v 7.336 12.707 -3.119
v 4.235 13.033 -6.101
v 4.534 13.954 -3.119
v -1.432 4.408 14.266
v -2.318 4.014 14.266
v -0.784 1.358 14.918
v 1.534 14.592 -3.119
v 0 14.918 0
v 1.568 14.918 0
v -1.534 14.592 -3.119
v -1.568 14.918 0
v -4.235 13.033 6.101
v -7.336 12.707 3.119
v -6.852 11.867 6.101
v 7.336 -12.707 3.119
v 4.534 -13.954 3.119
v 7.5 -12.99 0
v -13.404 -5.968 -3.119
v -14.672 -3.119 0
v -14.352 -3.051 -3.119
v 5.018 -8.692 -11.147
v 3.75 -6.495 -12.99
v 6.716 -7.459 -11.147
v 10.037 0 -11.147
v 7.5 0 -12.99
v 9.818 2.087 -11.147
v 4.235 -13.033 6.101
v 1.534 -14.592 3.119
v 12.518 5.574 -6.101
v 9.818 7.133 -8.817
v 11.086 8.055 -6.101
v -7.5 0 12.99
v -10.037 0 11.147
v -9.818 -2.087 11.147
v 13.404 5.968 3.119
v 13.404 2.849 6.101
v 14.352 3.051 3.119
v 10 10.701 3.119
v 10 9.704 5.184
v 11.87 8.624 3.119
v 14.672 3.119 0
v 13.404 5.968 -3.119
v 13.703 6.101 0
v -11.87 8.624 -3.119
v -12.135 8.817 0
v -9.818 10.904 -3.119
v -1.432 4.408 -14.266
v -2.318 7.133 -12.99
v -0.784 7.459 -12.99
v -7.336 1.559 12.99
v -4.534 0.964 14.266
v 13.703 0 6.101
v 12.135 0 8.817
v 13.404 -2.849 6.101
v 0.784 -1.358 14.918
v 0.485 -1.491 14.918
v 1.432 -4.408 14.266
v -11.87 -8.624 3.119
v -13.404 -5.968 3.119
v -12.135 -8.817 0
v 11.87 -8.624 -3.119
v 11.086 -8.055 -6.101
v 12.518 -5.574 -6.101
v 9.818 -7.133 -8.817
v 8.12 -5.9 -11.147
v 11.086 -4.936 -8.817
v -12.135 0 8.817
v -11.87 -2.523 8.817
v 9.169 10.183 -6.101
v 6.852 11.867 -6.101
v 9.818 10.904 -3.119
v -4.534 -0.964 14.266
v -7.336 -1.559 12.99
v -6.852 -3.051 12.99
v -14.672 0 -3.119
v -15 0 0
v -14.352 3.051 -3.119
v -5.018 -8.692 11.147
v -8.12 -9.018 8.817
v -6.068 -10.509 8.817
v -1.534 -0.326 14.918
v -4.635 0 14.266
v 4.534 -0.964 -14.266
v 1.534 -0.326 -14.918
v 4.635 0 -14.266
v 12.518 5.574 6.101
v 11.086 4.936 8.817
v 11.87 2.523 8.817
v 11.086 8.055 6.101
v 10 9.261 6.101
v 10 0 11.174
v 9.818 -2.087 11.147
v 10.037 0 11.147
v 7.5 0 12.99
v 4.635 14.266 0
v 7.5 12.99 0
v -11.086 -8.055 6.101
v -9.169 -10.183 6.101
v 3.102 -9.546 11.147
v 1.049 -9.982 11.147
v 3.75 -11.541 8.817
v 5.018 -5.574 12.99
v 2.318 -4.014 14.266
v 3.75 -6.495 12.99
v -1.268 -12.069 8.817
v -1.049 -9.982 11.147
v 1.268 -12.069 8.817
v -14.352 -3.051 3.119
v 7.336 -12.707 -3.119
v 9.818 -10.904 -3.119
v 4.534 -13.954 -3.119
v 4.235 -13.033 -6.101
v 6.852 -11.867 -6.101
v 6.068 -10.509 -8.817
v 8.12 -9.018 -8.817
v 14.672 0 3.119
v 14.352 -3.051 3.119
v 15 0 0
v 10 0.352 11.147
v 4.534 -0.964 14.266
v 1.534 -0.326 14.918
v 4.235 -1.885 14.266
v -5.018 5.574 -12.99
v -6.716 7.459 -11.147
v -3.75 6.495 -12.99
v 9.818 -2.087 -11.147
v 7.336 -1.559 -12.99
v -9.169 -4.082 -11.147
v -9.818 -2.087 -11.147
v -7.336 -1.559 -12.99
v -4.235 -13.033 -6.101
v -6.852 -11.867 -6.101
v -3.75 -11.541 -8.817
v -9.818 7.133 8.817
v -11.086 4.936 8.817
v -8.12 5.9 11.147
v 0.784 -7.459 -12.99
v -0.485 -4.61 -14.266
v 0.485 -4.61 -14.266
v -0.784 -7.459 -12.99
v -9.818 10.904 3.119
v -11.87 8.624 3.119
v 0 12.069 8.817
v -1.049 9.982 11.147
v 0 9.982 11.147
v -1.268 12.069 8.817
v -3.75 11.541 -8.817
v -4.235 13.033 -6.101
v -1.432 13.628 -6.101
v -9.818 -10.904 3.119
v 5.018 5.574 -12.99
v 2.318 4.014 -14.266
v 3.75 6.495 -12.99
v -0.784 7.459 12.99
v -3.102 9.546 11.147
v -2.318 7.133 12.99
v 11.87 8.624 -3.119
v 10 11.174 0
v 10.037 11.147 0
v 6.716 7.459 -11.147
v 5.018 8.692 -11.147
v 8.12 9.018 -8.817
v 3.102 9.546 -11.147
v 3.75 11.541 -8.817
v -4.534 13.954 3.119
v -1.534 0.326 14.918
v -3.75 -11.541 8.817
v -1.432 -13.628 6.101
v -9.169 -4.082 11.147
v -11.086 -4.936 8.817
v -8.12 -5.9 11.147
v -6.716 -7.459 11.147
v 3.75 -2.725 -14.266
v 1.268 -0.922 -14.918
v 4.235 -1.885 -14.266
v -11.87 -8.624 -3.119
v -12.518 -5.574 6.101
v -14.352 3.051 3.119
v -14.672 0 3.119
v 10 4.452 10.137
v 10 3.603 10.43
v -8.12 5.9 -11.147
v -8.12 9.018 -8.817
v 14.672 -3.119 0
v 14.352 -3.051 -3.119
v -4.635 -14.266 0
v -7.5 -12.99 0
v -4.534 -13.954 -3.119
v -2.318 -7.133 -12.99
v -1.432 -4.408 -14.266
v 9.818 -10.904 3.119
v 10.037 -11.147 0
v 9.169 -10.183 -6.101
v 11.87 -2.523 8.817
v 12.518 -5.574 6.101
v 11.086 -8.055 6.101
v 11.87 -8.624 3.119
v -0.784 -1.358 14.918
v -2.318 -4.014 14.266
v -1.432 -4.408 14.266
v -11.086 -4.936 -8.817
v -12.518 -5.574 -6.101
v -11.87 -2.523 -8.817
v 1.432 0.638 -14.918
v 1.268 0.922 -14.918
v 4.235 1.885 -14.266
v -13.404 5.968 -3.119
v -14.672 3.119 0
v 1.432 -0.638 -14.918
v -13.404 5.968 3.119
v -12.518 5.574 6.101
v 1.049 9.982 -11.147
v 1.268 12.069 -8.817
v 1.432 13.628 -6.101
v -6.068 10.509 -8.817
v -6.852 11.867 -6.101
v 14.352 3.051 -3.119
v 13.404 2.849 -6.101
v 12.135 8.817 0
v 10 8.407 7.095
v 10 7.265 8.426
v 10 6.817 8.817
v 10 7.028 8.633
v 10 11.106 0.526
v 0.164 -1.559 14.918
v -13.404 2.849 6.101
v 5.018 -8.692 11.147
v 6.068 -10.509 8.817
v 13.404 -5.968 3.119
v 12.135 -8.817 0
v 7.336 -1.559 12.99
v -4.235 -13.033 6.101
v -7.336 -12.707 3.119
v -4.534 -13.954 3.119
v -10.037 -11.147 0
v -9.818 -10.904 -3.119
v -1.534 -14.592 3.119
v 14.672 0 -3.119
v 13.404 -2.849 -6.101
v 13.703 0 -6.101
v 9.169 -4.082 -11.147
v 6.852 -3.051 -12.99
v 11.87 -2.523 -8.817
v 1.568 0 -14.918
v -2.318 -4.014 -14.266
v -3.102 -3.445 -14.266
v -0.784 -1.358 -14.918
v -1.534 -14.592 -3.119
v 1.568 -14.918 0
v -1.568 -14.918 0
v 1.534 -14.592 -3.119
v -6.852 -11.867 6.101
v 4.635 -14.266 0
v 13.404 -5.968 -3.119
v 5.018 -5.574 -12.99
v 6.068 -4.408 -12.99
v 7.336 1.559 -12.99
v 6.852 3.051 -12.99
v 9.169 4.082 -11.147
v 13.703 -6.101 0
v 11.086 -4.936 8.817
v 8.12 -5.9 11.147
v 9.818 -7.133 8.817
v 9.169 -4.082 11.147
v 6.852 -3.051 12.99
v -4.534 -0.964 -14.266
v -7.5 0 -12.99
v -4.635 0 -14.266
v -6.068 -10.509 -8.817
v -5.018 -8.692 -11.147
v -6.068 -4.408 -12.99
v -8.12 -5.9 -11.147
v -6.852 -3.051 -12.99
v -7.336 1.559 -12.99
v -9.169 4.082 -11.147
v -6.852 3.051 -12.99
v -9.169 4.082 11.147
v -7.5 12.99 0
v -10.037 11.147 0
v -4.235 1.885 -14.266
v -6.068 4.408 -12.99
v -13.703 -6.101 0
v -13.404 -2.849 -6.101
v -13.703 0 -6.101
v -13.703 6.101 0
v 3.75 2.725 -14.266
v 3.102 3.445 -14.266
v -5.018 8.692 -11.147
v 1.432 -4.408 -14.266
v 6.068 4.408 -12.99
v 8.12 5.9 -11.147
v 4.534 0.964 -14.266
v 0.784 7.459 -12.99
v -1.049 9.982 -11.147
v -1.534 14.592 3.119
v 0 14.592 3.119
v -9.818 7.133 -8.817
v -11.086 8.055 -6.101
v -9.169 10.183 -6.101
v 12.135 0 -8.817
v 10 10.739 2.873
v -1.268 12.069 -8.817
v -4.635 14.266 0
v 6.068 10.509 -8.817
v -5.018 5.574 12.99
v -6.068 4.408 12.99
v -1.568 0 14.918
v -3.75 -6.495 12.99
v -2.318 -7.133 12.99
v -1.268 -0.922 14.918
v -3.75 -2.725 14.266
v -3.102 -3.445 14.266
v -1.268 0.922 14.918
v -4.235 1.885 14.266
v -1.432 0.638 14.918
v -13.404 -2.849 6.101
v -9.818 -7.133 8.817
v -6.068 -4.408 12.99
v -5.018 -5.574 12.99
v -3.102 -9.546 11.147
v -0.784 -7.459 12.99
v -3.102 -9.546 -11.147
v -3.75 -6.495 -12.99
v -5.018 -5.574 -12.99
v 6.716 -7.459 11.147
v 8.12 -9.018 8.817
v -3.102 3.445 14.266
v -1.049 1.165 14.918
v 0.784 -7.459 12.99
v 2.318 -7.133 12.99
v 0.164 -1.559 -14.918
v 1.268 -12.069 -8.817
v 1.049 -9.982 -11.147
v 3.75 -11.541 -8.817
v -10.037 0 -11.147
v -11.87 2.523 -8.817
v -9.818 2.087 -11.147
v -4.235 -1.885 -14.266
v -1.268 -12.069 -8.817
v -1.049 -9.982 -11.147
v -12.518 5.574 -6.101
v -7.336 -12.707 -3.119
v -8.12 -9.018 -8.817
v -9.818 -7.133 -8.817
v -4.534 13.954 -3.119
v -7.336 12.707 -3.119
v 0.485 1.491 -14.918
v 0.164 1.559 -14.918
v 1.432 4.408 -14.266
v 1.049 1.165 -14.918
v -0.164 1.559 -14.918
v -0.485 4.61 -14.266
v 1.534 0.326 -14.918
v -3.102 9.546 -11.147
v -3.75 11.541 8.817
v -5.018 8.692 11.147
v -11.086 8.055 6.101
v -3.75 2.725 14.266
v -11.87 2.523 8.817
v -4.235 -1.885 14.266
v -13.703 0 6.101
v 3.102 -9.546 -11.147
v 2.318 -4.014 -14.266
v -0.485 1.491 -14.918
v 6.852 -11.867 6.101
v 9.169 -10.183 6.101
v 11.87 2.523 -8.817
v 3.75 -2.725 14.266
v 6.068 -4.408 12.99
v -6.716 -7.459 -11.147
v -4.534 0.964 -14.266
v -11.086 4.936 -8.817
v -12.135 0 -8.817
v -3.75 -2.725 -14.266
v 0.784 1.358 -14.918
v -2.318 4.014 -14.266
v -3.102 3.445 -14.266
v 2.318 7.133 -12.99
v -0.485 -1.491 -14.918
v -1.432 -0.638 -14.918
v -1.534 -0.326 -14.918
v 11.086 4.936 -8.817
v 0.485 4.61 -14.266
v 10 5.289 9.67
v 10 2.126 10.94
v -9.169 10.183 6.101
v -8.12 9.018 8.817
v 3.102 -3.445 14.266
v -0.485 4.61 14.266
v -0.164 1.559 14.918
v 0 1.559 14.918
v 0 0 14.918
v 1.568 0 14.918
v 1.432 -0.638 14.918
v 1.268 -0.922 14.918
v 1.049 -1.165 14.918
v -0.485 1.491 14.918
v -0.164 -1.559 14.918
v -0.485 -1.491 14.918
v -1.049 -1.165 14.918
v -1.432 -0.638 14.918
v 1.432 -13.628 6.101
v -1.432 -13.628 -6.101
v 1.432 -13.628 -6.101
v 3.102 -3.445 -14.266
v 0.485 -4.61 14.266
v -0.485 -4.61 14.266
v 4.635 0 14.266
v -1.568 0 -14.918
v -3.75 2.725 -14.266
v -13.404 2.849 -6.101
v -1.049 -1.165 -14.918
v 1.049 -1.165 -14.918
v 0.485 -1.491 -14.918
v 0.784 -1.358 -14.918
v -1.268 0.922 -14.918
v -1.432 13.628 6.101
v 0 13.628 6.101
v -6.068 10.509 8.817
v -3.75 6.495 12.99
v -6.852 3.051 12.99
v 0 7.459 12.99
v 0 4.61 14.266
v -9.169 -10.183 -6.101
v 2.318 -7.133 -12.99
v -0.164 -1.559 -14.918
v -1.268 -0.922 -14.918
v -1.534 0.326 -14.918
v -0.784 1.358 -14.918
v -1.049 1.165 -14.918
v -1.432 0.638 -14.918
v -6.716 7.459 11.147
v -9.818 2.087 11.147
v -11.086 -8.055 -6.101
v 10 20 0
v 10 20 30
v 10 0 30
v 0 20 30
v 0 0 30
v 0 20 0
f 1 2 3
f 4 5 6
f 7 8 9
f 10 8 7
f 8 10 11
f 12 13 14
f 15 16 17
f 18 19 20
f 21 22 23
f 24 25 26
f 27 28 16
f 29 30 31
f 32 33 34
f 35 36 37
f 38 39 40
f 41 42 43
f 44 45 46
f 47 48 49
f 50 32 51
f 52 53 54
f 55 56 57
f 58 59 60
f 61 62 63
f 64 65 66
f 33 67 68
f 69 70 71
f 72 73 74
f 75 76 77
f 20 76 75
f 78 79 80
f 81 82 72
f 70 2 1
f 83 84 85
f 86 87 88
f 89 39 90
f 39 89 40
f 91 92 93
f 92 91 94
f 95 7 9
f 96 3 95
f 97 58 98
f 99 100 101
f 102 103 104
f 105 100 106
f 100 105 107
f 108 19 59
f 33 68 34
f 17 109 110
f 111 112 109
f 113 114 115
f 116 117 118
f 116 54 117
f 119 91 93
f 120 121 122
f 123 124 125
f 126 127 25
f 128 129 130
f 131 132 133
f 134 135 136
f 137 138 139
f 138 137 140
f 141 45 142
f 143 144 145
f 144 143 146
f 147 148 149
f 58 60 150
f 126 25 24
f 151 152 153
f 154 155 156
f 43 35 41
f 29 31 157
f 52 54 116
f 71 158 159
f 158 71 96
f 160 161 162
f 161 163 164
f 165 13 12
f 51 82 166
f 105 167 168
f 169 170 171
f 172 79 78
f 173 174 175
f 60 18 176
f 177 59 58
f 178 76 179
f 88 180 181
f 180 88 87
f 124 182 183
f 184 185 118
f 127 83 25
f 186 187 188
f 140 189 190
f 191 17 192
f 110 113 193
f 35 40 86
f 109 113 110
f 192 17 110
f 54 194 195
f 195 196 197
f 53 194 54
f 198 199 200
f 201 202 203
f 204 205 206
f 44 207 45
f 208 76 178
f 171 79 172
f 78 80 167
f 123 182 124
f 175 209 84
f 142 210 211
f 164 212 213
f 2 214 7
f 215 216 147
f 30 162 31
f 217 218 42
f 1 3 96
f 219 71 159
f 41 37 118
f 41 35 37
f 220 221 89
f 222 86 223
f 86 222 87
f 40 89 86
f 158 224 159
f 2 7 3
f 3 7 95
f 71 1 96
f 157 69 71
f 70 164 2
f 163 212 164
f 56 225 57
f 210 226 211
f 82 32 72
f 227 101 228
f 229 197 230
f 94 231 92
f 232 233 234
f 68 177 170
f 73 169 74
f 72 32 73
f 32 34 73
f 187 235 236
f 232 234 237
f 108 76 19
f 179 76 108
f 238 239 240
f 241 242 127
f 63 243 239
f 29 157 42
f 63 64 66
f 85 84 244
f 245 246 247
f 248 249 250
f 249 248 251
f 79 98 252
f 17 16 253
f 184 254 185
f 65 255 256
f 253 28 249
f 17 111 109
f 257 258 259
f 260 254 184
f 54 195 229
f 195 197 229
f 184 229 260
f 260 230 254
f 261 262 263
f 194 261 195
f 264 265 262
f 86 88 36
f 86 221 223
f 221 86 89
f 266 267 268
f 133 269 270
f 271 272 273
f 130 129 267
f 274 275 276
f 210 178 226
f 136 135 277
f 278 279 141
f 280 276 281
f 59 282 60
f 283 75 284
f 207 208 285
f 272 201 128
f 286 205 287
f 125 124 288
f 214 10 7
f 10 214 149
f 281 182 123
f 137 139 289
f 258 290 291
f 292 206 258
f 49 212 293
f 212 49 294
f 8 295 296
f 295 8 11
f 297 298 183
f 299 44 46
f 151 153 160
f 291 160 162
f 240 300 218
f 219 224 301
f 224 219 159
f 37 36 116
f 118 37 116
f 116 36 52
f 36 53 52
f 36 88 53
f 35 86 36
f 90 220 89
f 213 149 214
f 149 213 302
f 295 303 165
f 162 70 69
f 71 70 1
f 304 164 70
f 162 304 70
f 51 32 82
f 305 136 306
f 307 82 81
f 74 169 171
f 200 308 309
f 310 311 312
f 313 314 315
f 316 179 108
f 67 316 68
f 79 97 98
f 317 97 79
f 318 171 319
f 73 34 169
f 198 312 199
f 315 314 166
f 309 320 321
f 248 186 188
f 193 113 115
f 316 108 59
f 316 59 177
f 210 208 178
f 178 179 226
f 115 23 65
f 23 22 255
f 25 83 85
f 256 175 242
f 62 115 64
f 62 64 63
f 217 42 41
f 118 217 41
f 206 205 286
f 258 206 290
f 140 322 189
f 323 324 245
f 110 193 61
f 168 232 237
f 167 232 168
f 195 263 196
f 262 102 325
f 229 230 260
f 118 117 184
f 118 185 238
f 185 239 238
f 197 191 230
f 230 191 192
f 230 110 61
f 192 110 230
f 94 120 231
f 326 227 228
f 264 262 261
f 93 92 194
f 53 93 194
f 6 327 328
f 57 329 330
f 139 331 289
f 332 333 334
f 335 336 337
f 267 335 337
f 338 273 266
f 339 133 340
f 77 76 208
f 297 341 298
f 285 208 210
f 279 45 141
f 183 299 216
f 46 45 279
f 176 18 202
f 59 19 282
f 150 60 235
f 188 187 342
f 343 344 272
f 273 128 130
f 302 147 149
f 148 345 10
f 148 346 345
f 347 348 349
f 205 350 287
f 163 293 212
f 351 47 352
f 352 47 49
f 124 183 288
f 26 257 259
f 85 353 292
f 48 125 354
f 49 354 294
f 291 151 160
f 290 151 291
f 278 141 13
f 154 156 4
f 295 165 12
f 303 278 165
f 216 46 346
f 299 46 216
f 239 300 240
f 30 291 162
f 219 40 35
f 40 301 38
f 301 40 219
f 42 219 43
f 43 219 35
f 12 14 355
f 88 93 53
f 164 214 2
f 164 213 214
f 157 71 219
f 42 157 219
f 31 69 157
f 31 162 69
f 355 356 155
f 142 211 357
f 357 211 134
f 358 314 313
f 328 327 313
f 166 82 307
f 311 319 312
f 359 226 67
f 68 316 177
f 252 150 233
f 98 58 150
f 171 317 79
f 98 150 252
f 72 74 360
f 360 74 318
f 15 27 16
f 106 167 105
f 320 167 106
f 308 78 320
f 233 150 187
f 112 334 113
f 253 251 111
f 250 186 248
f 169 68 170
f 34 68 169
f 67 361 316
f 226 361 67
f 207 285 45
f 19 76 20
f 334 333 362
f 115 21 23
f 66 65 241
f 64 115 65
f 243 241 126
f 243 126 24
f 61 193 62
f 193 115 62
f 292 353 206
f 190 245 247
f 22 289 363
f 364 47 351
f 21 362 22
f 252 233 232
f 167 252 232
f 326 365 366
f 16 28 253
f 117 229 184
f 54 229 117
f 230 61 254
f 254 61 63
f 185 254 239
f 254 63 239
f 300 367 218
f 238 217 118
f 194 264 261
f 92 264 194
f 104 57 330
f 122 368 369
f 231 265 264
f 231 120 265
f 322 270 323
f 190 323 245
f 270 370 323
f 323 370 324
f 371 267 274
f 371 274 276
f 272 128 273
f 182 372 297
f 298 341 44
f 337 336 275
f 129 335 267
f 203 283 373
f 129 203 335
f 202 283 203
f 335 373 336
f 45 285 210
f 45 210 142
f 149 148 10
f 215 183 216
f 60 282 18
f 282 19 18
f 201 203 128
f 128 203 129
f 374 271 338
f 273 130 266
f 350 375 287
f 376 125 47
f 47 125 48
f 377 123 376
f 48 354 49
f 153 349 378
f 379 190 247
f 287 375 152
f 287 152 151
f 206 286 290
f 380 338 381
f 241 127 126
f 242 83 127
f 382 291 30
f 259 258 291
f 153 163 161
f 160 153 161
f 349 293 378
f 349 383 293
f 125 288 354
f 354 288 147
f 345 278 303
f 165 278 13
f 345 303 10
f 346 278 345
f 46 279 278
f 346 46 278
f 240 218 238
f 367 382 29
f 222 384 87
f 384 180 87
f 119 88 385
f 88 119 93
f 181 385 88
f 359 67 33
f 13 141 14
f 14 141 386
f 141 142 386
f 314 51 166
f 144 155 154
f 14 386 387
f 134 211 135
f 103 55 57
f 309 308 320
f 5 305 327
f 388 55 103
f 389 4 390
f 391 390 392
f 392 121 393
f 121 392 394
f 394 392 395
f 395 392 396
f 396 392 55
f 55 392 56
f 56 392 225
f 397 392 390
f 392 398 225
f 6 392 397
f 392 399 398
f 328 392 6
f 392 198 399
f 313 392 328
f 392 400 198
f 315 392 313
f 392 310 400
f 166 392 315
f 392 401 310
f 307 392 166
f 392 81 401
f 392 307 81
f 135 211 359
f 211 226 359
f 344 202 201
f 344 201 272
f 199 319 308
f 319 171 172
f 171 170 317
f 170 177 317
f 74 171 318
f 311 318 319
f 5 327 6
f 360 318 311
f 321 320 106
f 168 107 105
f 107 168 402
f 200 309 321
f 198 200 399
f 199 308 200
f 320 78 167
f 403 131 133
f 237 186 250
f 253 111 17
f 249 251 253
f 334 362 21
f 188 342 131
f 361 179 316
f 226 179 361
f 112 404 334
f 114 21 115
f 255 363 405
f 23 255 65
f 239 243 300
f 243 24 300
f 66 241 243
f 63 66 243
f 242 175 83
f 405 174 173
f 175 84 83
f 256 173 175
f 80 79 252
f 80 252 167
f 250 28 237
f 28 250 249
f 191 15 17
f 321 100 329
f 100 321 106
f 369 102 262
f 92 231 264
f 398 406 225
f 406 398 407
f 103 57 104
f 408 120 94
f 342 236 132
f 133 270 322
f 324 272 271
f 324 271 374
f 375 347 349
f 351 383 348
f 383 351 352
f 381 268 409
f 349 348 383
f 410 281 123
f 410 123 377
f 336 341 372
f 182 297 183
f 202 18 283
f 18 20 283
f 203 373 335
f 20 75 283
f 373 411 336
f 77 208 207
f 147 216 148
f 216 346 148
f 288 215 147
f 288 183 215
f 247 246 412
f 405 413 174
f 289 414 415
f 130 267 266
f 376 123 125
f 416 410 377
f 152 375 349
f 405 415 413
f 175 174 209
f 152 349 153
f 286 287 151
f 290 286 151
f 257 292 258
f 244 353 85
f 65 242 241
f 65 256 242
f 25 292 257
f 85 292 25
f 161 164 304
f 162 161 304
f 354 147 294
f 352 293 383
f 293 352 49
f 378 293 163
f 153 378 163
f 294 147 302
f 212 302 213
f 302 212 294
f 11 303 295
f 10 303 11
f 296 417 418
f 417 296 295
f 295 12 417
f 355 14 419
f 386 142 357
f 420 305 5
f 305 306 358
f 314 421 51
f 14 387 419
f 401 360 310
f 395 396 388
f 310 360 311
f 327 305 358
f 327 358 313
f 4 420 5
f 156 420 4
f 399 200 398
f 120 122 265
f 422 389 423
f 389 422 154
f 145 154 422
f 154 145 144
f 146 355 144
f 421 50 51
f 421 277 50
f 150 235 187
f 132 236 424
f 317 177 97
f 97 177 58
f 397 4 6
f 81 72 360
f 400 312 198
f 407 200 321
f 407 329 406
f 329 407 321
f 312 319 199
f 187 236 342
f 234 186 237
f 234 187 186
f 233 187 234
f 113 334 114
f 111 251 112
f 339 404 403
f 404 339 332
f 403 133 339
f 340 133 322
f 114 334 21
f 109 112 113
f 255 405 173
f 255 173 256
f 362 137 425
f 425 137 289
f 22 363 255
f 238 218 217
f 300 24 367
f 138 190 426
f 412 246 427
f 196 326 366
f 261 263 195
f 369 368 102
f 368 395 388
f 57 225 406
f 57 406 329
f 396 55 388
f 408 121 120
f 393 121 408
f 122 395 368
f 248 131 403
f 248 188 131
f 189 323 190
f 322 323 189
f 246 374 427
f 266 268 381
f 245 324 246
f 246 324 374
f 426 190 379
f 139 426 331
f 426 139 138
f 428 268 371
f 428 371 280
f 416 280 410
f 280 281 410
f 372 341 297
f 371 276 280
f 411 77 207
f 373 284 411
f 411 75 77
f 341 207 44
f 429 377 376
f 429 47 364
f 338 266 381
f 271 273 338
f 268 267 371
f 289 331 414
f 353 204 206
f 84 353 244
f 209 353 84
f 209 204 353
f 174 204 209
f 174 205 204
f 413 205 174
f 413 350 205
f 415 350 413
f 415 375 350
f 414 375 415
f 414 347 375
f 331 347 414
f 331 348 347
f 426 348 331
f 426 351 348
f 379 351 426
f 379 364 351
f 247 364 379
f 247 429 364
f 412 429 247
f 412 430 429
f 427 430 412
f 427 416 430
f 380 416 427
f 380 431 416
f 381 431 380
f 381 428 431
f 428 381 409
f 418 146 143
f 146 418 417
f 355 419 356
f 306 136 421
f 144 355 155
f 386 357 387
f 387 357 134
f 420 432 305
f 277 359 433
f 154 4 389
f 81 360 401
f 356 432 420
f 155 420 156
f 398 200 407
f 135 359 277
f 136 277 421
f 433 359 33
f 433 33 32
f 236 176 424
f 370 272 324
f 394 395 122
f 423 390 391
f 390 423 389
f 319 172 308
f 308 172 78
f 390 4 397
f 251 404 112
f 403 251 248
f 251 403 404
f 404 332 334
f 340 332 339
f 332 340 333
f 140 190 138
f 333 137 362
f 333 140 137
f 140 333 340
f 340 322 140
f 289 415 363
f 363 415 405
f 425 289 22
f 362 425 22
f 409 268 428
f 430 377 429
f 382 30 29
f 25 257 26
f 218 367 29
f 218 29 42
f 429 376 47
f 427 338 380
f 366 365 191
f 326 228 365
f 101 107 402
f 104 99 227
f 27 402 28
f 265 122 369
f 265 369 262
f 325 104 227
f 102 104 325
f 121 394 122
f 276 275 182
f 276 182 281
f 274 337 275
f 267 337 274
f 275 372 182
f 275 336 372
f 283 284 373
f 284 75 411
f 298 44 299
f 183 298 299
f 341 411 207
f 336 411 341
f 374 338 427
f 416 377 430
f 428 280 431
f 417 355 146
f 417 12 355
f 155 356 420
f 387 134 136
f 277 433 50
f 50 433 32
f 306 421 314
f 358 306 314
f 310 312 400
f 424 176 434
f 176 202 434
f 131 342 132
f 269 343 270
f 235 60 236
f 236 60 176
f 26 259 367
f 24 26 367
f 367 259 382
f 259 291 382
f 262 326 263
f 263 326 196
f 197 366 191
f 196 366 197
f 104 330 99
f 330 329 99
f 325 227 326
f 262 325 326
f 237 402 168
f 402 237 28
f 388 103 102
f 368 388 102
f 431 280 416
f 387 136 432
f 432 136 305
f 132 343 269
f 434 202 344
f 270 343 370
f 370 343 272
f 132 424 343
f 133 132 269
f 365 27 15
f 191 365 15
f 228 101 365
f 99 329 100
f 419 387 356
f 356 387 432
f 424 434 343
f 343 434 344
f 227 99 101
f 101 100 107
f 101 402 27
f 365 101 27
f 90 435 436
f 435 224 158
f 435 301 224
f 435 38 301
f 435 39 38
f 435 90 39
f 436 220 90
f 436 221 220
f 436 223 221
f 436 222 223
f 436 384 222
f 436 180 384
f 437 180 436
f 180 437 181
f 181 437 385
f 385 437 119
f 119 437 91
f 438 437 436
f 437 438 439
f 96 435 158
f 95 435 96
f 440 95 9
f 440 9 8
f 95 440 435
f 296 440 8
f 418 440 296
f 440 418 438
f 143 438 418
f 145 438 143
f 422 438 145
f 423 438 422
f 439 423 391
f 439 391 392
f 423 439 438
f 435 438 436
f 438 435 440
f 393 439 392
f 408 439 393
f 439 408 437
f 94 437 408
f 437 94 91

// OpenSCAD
union() {
sphere(d=30);
cube(size=[10,20,30]);
}

/* <json>
Gibberish!
</json>
*/
